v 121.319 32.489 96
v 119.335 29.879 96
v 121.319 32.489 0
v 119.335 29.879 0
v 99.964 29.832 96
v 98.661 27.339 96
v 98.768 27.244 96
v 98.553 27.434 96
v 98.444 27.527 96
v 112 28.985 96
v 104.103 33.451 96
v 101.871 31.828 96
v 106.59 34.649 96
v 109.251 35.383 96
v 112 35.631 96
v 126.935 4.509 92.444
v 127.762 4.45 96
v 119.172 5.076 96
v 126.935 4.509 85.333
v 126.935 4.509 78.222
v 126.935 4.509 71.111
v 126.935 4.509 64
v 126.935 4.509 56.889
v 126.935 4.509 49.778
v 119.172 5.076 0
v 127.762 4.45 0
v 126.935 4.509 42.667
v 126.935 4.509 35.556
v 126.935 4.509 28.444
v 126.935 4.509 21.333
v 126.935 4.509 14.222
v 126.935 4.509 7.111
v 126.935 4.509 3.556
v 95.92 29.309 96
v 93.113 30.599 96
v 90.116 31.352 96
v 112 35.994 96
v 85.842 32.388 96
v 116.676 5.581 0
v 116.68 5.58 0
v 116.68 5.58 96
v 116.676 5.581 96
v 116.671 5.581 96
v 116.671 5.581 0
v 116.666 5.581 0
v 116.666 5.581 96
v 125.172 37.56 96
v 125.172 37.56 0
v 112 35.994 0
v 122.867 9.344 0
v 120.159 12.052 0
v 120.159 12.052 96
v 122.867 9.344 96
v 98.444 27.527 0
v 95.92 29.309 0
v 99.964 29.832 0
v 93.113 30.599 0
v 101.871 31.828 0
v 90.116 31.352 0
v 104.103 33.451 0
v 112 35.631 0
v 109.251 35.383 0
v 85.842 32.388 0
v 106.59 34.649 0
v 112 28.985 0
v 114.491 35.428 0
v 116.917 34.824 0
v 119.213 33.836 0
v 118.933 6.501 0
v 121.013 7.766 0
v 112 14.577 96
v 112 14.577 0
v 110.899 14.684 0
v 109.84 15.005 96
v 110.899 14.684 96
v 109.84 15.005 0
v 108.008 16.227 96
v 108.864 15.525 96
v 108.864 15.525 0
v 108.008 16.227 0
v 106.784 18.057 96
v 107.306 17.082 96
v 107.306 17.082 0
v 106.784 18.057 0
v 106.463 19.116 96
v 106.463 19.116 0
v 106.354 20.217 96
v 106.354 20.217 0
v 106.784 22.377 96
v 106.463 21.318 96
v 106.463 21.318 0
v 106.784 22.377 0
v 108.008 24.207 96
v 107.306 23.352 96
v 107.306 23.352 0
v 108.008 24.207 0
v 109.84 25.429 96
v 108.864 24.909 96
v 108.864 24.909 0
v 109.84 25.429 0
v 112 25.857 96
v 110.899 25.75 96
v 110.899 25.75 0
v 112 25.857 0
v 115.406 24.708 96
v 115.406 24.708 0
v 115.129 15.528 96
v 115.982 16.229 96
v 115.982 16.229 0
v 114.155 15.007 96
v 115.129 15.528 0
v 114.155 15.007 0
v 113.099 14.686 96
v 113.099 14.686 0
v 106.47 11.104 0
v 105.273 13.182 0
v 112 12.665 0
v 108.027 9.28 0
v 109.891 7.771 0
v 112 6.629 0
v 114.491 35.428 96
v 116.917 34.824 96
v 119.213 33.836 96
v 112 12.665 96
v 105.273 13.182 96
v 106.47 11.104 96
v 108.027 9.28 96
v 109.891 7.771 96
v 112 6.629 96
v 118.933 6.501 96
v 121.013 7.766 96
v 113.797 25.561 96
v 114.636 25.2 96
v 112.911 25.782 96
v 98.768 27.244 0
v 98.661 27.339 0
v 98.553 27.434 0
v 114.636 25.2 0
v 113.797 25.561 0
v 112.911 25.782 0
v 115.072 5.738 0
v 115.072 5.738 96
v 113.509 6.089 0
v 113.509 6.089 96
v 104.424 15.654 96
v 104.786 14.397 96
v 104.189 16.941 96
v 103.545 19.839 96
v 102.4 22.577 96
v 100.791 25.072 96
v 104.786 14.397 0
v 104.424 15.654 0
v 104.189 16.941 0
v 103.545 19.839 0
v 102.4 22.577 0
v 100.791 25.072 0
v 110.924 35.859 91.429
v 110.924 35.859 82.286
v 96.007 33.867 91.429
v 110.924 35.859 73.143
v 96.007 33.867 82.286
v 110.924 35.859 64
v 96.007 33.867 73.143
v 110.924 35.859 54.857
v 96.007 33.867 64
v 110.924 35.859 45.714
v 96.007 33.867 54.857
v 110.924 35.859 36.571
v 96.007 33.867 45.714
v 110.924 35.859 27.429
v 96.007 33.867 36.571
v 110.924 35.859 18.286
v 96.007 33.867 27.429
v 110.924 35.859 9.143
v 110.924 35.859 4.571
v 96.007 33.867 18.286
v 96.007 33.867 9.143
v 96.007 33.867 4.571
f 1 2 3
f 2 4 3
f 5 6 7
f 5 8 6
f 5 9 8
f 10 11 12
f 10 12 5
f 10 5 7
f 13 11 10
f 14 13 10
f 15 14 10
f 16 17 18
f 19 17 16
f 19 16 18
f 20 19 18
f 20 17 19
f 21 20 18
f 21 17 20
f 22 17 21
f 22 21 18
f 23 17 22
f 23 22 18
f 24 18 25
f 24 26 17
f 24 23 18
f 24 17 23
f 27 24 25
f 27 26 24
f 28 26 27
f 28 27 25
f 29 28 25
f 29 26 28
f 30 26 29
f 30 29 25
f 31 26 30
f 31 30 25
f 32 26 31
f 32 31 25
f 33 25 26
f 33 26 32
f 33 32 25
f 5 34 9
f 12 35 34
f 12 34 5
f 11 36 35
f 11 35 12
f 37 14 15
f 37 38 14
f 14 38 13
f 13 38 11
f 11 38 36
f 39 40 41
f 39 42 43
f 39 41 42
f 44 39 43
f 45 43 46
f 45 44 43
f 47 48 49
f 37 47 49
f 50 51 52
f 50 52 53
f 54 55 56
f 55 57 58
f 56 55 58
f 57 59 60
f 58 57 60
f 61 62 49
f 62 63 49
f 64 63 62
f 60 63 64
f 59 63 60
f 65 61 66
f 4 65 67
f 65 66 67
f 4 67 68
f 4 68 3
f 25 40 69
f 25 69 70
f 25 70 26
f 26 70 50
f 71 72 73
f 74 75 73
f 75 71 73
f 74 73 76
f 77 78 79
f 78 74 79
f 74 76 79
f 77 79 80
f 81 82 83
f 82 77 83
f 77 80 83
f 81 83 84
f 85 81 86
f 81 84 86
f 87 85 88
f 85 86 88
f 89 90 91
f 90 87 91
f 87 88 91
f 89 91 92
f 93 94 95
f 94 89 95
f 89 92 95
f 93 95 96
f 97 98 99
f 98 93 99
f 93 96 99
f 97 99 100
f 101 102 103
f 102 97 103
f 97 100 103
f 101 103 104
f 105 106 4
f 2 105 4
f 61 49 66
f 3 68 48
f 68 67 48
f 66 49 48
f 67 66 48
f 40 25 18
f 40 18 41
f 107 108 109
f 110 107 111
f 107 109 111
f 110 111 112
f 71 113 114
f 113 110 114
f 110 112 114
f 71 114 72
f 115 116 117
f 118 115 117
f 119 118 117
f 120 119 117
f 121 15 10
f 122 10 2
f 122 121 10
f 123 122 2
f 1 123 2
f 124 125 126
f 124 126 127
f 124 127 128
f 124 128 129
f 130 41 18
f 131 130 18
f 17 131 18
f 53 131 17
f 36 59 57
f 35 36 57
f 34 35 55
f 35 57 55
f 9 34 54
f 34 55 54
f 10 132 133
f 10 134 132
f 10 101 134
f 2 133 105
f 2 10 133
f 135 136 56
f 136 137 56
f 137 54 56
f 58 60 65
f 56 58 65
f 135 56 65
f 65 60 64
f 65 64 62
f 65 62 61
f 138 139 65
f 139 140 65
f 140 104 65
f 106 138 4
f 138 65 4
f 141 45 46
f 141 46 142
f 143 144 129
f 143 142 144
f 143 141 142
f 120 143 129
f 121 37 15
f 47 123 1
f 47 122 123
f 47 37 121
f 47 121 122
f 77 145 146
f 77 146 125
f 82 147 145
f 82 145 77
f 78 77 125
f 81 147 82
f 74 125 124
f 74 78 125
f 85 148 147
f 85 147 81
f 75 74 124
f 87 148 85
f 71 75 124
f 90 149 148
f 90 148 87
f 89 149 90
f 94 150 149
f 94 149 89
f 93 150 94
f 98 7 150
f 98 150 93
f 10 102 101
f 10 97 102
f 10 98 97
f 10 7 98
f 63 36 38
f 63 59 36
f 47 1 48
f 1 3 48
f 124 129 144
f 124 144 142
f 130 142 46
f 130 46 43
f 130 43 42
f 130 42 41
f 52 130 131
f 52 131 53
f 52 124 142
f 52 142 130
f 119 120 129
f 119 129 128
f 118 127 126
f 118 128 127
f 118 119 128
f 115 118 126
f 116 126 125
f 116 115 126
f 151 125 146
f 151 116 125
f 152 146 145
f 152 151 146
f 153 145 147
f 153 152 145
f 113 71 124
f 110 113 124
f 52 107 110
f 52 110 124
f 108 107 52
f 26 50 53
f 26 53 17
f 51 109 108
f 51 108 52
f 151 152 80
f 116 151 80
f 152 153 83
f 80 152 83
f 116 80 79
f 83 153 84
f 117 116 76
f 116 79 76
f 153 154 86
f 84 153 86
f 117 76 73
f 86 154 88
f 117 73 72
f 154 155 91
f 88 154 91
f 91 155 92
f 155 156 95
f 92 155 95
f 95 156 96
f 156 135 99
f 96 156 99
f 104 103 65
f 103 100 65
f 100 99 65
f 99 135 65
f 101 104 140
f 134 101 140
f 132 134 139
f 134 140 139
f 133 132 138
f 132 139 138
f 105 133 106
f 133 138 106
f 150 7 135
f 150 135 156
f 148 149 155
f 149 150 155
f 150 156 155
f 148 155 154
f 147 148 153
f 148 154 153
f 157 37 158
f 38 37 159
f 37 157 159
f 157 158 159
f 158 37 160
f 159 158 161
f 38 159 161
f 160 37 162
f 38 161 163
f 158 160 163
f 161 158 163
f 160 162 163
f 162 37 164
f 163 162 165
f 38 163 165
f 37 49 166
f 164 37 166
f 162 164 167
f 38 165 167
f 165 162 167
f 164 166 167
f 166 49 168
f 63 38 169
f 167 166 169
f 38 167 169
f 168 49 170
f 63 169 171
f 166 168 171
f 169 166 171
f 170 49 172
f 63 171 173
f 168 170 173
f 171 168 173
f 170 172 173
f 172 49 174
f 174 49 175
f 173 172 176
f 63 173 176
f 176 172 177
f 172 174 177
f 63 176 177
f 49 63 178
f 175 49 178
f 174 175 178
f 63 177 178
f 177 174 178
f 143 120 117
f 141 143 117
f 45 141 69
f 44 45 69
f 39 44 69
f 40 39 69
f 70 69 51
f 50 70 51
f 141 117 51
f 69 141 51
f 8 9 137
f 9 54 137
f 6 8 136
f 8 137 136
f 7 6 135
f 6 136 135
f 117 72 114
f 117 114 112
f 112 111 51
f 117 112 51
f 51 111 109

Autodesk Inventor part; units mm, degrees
ref_plane "YZ Plane" through (0, 0, 0) normal (1, 0, 0) x (0, 1, 0)
ref_plane "XZ Plane" through (0, 0, 0) normal (0, 1, 0) x (-1, 0, 0)
ref_plane "XY Plane" through (0, 0, 0) normal (0, 0, 1) x (1, 0, 0)
sketch "Sketch1" plane through (0, 0, 0) normal (0, 0, 1) x (1, 0, 0)
  spline S0 degree 4 poles (254.4361, 38.2581) (252.1599, 38.6503) (246.7887, 39.4993) (237.9849, 40.6183) (225.3575, 41.7043) (211.2027, 42.3417) (196.3926, 42.4701) (181.0313, 42.0702) (165.5064, 41.2217) (149.7852, 40.0448) (134.1096, 38.5775) (118.6247, 36.8508) (103.5, 34.9393) (88.9016, 32.8834) (74.9958, 30.7382) (61.9178, 28.5627) (49.8271, 26.4098) (38.8354, 24.34) (29.0772, 22.4039) (20.6323, 20.6564) (13.6456, 19.1491) (6.9132, 17.6607) (2.9022, 16.74) (0.4691, 16.1882) (0, 16.065) knots 0.214297 0.214297 0.214297 0.214297 0.214297 0.24332 0.281775 0.321542 0.36238 0.404005 0.446178 0.488665 0.531231 0.573688 0.615803 0.657336 0.698047 0.737682 0.775986 0.812688 0.847495 0.880087 0.910093 0.937059 0.960363 1 1 1 1 1
  spline S1 degree 4 poles (300, 15.624) (299.8057, 13.313) (297.7085, 10.3432) (293.0509, 7.5008) (285.3959, 4.883) (278.1124, 3.2165) (269.5147, 1.8925) (259.681, 0.913) (248.7129, 0.2783) (236.7119, -0.0309) (223.8067, -0.0504) (210.1253, 0.1933) (195.7754, 0.645) (180.9677, 1.2494) (165.6517, 1.9825) (150.1916, 2.9048) (134.6873, 3.9451) (119.3375, 5.0495) (104.3042, 6.1987) (89.7566, 7.3561) (75.8492, 8.4887) (62.7429, 9.5824) (50.5811, 10.6226) (39.4971, 11.5797) (29.6294, 12.4513) (21.0712, 13.2264) (13.9639, 13.8721) (7.1036, 14.5126) (2.9683, 14.8997) (0.533, 15.1397) (-0.0042, 15.1841) knots 0 0 0 0 0 0.054372 0.079821 0.107912 0.138499 0.171341 0.206187 0.242784 0.280891 0.320277 0.360713 0.402023 0.443985 0.486373 0.528958 0.57146 0.613642 0.655265 0.696085 0.735853 0.774308 0.811174 0.846157 0.87893 0.909115 0.936252 0.959711 1 1 1 1 1
  arc A0 (0, 16.065) -> (-0.0042, 15.1841) centre (0.1158, 15.624) ccw
  line L0 (0.1158, 15.624) -> (227.9902, 15.624) construction
  line L1 (300, 15.624) -> (0.1158, 15.624) construction
  line L2 (300, 15.624) -> (200, 15.624) construction
  line L3 (200, 15.624) -> (200, 42.3773) construction
  line L4 (200, 15.624) -> (200, 0.5273)
  line L5 (0, 0) -> (0, 20.241)
  line L6 (0, 20.241) -> (238.581, 20.241) construction
  circle A1 centre (238.581, 20.241) radius 14
  line L7 (238.581, 20.241) -> (208.581, 20.241)
  line L8 (238.581, 25.359) -> (238.581, 20.241)
  line L9 (0, 20.241) -> (112, 20.241) construction
  circle A2 centre (112, 20.241) radius 5.39
  line L10 (0, 15.624) -> (112, 15.624) construction
  line L11 (0, 15.624) -> (112, 15.624) construction
  line L12 (112, 15.624) -> (112, 35.9945)
  line L13 (112, 15.624) -> (112, 5.6153)
  spline S2 degree 4 poles (299.2852, 20.241) (299.2279, 20.1316) (299.168, 20.0232) (299.1056, 19.9158) (299.0406, 19.8092) knots 0.014818 0.014818 0.014818 0.014818 0.014818 0.017711 0.017711 0.017711 0.017711 0.017711
  line L14 (299.2071, 20.0822) -> (298.8742, 19.5363) construction
  arc A3 (298.904, 19.5932) -> (299.1702, 20.0296) centre (292.2911, 23.9254) ccw construction
  line L15 (299.432, 20.5214) -> (299.1384, 19.9606) construction
  arc A4 (299.1639, 20.0188) -> (299.3987, 20.4672) centre (292.801, 23.6361) ccw construction
  spline S3 degree 2 poles (295.8506, 16.56) (295.1573, 16.0692) (294.3933, 15.624) knots 0 0 0 1 1 1
  line L16 (294.5507, 15.7157) -> (294.2359, 15.5323) construction
  arc A5 (294.2672, 15.5511) -> (294.519, 15.6978) centre (283.8844, 33.657) ccw construction
  spline S4 degree 4 poles (296.8569, 15.624) (296.6183, 15.8629) (296.3707, 16.0985) (296.1147, 16.3309) (295.8506, 16.56) knots 0.044099 0.044099 0.044099 0.044099 0.044099 0.050856 0.050856 0.050856 0.050856 0.050856
  spline S5 degree 4 poles (219.5872, 34.9119) (218.6954, 34.952) (214.8585, 35.1063) (210.7072, 35.3295) (192.898, 35.4464) (181.4278, 35.0555) (165.1774, 34.1819) (149.5619, 33.1267) (133.8284, 31.3479) (128.2654, 31.0974) (123.3908, 30.59) knots 0 0 0 0 0 0.139244 0.23322 0.363937 0.509983 0.657115 0.798105 1 1 1 1 1
  line L17 (295.9593, 16.4657) -> (295.7419, 16.6543) construction
  arc A6 (295.9374, 16.4843) -> (295.7635, 16.6352) centre (281.8729, 0.4516) ccw construction
  line L18 (232.7438, 34.3645) -> (201.1936, 35.6815) construction
  arc A7 (229.5868, 34.4549) -> (204.3471, 35.5085) centre (136.3483, -1896.3245) ccw construction
  arc A8 (264.2661, 15.123) -> (264.3608, 15.624) centre (238.581, 20.241) ccw
  circle A9 centre (238.581, 20.241) radius 24
  circle A10 centre (112, 20.241) radius 15.39
  spline S6 degree 4 poles (300, 15.624) (300.2691, 17.9337) (298.7834, 21.2677) (294.6934, 24.9798) (287.5317, 28.9406) (280.4869, 31.8205) (271.481, 34.7182) (262.4868, 36.793) (257.7004, 37.6957) (254.4361, 38.2581) knots 0 0 0 0 0 0.247555 0.363857 0.49255 0.632996 0.778264 1 1 1 1 1
  line L19 (285.2945, 32.941) -> (223.5776, 43.5753) construction
  arc A11 (278.7224, 32.6349) -> (229.6682, 41.0872) centre (217.2184, -177.7386) ccw construction
  line L20 (285.2945, 32.941) -> (223.5776, 43.5753) construction
  arc A12 (278.8771, 33.0418) -> (229.6586, 41.5224) centre (200.8949, -272.4733) ccw construction
  spline S7 degree 4 poles (251.493, 31.7362) (243.7009, 32.9676) (232.1602, 34.2966) (216.4428, 35.2879) (196.3923, 35.4611) (181.0317, 35.0615) (165.5053, 34.2127) (149.7883, 33.0365) (134.1012, 31.5672) (118.6474, 29.8462) (103.4397, 27.9193) (89.0589, 25.9037) (74.8371, 23.6927) (62.4884, 21.6695) (49.6399, 19.3545) (46.3795, 18.7429) (43.8125, 18.259) knots 0 0 0 0 0 0.163963 0.232338 0.302031 0.372642 0.443778 0.515047 0.586134 0.656647 0.726187 0.794348 0.86071 0.920346 1 1 1 1 1
  spline S8 degree 4 poles (295.845, 16.556) (295.7198, 16.6646) (294.585, 17.6283) (292.0585, 19.4283) (287.5167, 21.9347) (280.467, 24.8321) (271.9714, 27.5226) (264.2087, 29.4004) (258.4092, 30.5515) (255.0536, 31.1429) (254.4361, 31.2493) (253.9689, 31.3298) (253.5018, 31.4103) (253.0347, 31.4908) (252.5676, 31.5712) knots 0.050892 0.050892 0.050892 0.050892 0.050892 0.054094 0.079507 0.107628 0.138317 0.171335 0.206423 0.214297 0.214297 0.214297 0.214297 0.220253 0.220253 0.220253 0.220253 0.220253
  line L21 (285.2945, 25.9322) -> (223.5776, 36.5664) construction
  line L22 (285.2945, 25.9322) -> (223.5776, 36.5664) construction
  arc A13 (278.7224, 25.626) -> (229.6682, 34.0784) centre (217.2184, -184.7474) ccw construction
  line L23 (270.129, 9.1254) -> (275.129, 9.1254) construction
  line L24 (281.07, 24.4582) -> (286.07, 24.4582) construction
  line L25 (318.8214, -3.3673) -> (272.8686, 36.4793) construction
  arc A14 (303.2079, 0.552) -> (278.9595, 21.5782) centre (281.8576, 0.4252) ccw construction
  spline S9 degree 4 poles (295.8353, 16.5644) (293.4171, 14.8846) (288.4135, 12.6926) (280.7063, 10.6698) (269.511, 8.9398) (259.6826, 7.9632) (248.7122, 7.3273) (236.7121, 7.0186) (223.8065, 6.9989) (210.1254, 7.2427) (195.7753, 7.6944) (180.968, 8.2987) (165.6509, 9.032) (150.1939, 9.954) (134.681, 10.995) (119.3545, 12.0974) (104.259, 13.2519) (89.8748, 14.3954) (75.7524, 15.5471) (62.9065, 16.6165) (50.5107, 17.6776) (46.5166, 18.0246) (43.8125, 18.259) knots 0 0 0 0 0 0.084767 0.124025 0.166179 0.210904 0.257877 0.306788 0.35734 0.409241 0.462263 0.516122 0.570528 0.625186 0.679738 0.73388 0.787304 0.839697 0.89074 0.937143 1 1 1 1 1
  spline S10 degree 4 poles (21.4623, 20.241) (20.6227, 20.317) (20.124, 20.3622) (19.9191, 20.3809) (19.554, 20.414) knots 0.979732 0.979732 0.979732 0.979732 0.979732 1 1 1 1 1 construction
  line L26 (68.4884, 16.1198) -> (19.1367, 20.3983) construction
  arc A15 (63.5515, 16.5281) -> (24.0702, 19.9509) centre (-819.8994, -9944.3712) ccw construction
  line L27 (21.7244, 20.2173) -> (21.2001, 20.2647) construction
  arc A16 (21.2525, 20.26) -> (21.672, 20.222) centre (898.6358, 9712.9556) ccw construction
  line L28 (74.2541, 23.9969) -> (13.371, 12.5211) construction
  arc A17 (68.1759, 22.7939) -> (19.47, 13.6134) centre (1053.3901, -5337.891) ccw construction
  spline S11 degree 4 poles (218.4375, 7.1934) (217.6173, 7.2408) (213.8192, 7.4688) (209.5863, 6.8507) (192.5485, 7.9441) (181.1469, 8.163) (165.7461, 9.0283) (149.1424, 9.8801) (139.9777, 10.7519) (129.1073, 11.2464) (124.6867, 11.5289) knots 0 0 0 0 0 0.127631 0.213723 0.333628 0.467446 0.602621 0.738424 0.880395 0.880395 0.880395 0.880395 0.880395
  line L29 (133.5337, 10.9635) -> (115.8396, 12.0942) construction
  arc A18 (117.618, 12.0789) -> (131.7678, 11.1747) centre (141.027, 267.2384) ccw construction
  line L30 (140.665, 32.3881) -> (106.1166, 28.792) construction
  arc A19 (137.222, 31.4497) -> (109.679, 28.5828) centre (140.6225, -134.9596) ccw construction
  circle A20 centre (238.581, 20.241) radius 18
  line L31 (238.581, 38.241) -> (225.78, 41.559)
  line L32 (238.581, 2.241) -> (224.22, 0)
  line L33 (214.581, 20.241) -> (214.581, 42.1266) construction
  line L34 (127.39, 20.241) -> (127.39, 11.5255) construction
  line L35 (127.39, 20.241) -> (131.3139, 20.241) construction
  line L36 (96.61, 20.241) -> (96.61, 13.8631) construction
  line L37 (270.129, 5.6153) -> (270.129, 15.624) construction
  line L38 (272.129, 7.6153) -> (272.129, 13.624)
  line L39 (268.129, 13.624) -> (268.129, 7.6153)
  arc A21 (268.129, 7.6153) -> (272.129, 7.6153) centre (270.129, 7.6153) ccw
  arc A22 (272.129, 13.624) -> (268.129, 13.624) centre (270.129, 13.624) ccw
  line L40 (270.129, 32.1807) -> (270.129, 22.172) construction
  line L41 (272.129, 30.1807) -> (272.129, 24.172)
  line L42 (268.129, 24.172) -> (268.129, 30.1807)
  arc A23 (272.129, 30.1807) -> (268.129, 30.1807) centre (270.129, 30.1807) ccw
  arc A24 (268.129, 24.172) -> (272.129, 24.172) centre (270.129, 24.172) ccw
  arc A25 (200, 42.3155) -> (199.8539, 42.3773) centre (190.581, 20.241) ccw
  arc A26 (171.273, 34.4958) -> (171.2681, 34.4892) centre (190.581, 20.241) ccw
  arc A27 (210.7484, 7.2304) -> (209.2875, 35.2765) centre (190.581, 20.241) ccw
  arc A28 (169.4455, 8.8703) -> (169.4744, 8.8168) centre (190.581, 20.241) ccw
  arc A29 (153.9768, 9.6824) -> (154.0303, 9.7394) centre (142.78, 20.241) ccw
  arc A30 (151.2419, 33.0959) -> (151.2193, 33.1107) centre (142.78, 20.241) ccw
  arc A31 (132.1299, 31.3508) -> (130.3229, 11.2037) centre (142.78, 20.241) ccw
  arc A32 (95.2741, 13.9693) -> (95.1698, 26.7415) centre (81.22, 20.241) ccw
  arc A33 (66.334, 16.3348) -> (66.5389, 15.624) centre (81.22, 20.241) ccw
  line L43 (112, 20.241) -> (112, 14.851) construction
  line L44 (112, 14.851) -> (91.265, 14.851) construction
  circle A34 centre (91.265, 14.851) radius 4
  circle A35 centre (111.9941, 20.217) radius 5.39
  arc A36 (104.1892, 16.9411) -> (90.1164, 31.3517) centre (87.5379, 14.7568) ccw
  arc A37 (104.1892, 16.9411) -> (116.9519, 5.574) centre (117.1466, 18.6408) ccw
  line L45 (90.1164, 31.3517) -> (85.8424, 32.3881)
  line L46 (119.172, 5.076) -> (116.6664, 5.5813)
  circle A38 centre (238.581, 20.241) radius 13.69
  circle A39 centre (111.9941, 20.217) radius 5.64
  line L47 (111.9941, 20.217) -> (125.1716, 37.5596)
  line L48 (111.9941, 20.217) -> (127.7615, 4.4495)
  line L49 (111.9941, 20.217) -> (119.9703, 20.217) construction
  point P0 (0.783, 16.254)
  point P1 (3.213, 16.812)
  point P2 (7.239, 17.724)
  point P3 (12.813, 18.96)
  point P4 (19.884, 20.484)
  point P5 (28.374, 22.245)
  point P6 (38.199, 24.195)
  point P7 (49.254, 26.28)
  point P8 (61.419, 28.446)
  point P9 (74.571, 30.636)
  point P10 (88.56, 32.793)
  point P11 (103.242, 34.86)
  point P12 (118.455, 36.783)
  point P13 (134.028, 38.511)
  point P14 (149.793, 39.984)
  point P15 (165.576, 41.16)
  point P16 (181.206, 41.985)
  point P17 (196.638, 42.363)
  point P18 (211.554, 42.222)
  point P19 (239.145, 40.389)
  point P20 (262.68, 36.666)
  point P21 (272.577, 34.218)
  point P22 (281.07, 31.467)
  point P23 (288.069, 28.491)
  point P24 (293.505, 25.359)
  point P25 (297.324, 22.137)
  point P26 (300, 15.624)
  point P27 (0.861, 15.105)
  point P28 (3.342, 14.868)
  point P29 (7.446, 14.481)
  point P30 (13.122, 13.953)
  point P31 (20.31, 13.296)
  point P32 (28.92, 12.519)
  point P33 (38.856, 11.64)
  point P34 (50.007, 10.674)
  point P35 (62.244, 9.63)
  point P36 (75.429, 8.529)
  point P37 (89.418, 7.389)
  point P38 (104.052, 6.228)
  point P39 (134.613, 3.966)
  point P40 (150.207, 2.928)
  point P41 (165.783, 2.013)
  point P42 (181.167, 1.263)
  point P43 (196.068, 0.663)
  point P44 (210.468, 0.225)
  point P45 (237.189, 0.039)
  point P46 (249.246, 0.378)
  point P47 (260.262, 1.05)
  point P48 (270.129, 2.076)
  point P49 (278.739, 3.462)
  point P50 (285.993, 5.211)
  point P51 (291.81, 7.314)
  point P52 (296.121, 9.756)
  point P53 (298.863, 12.531)
  point P54 (200, 15.624)
  point P55 (225.3642, 15.624)
  point P56 (238.581, 6.241)
  point P57 (238.581, 34.241)
  point P58 (225.3642, 15.624)
  point P59 (251.7978, 15.624)
  point P60 (0, 16.065)
  point P61 (0, 15.1838)
  point P62 (224.581, 20.241)
  point P63 (112, 25.631)
  point P64 (0, 9.065)
  point P65 (0.783, 9.254)
  point P66 (3.213, 9.812)
  point P67 (7.239, 10.724)
  point P68 (12.813, 11.96)
  point P69 (19.884, 13.484)
  point P70 (28.374, 15.245)
  point P71 (38.199, 17.195)
  point P72 (49.254, 19.28)
  point P73 (61.419, 21.446)
  point P74 (74.571, 23.636)
  point P75 (88.56, 25.793)
  point P76 (103.242, 27.86)
  point P77 (118.455, 29.783)
  point P78 (134.028, 31.511)
  point P79 (149.793, 32.984)
  point P80 (165.576, 34.16)
  point P81 (181.206, 34.985)
  point P82 (225.78, 34.559)
  point P83 (239.145, 33.389)
  point P84 (251.493, 31.745)
  point P85 (262.68, 29.666)
  point P86 (272.577, 27.218)
  point P87 (281.07, 24.467)
  point P88 (288.069, 21.491)
  point P89 (293.505, 18.359)
  point P90 (297.324, 15.137)
  point P91 (299.493, 11.879)
  point P92 (300, 8.624)
  point P93 (-0.0042, 22.1841)
  point P94 (0.861, 22.105)
  point P95 (3.342, 21.868)
  point P96 (7.446, 21.481)
  point P97 (13.122, 20.953)
  point P98 (20.31, 20.296)
  point P99 (28.92, 19.519)
  point P100 (38.856, 18.64)
  point P101 (50.007, 17.674)
  point P102 (62.244, 16.63)
  point P103 (75.429, 15.529)
  point P104 (89.418, 14.389)
  point P105 (104.052, 13.228)
  point P106 (119.172, 12.076)
  point P107 (134.613, 10.966)
  point P108 (150.207, 9.928)
  point P109 (165.783, 9.013)
  point P110 (181.167, 8.263)
  point P111 (196.068, 7.663)
  point P112 (210.468, 7.225)
  point P113 (224.22, 7)
  point P114 (237.189, 7.039)
  point P115 (249.246, 7.378)
  point P116 (260.262, 8.05)
  point P117 (270.129, 9.076)
  point P118 (278.739, 10.462)
  point P119 (285.993, 12.211)
  point P120 (291.81, 14.314)
  point P121 (296.121, 16.756)
  point P122 (298.863, 19.531)
  point P123 (300, 22.624)
  point P124 (18.7405, 20.241)
  point P125 (216.9687, 35.023)
  point P126 (0, 16.065)
  point P127 (296.8569, 15.624)
  point P128 (294.3933, 15.624)
  point P129 (219.5872, 34.9119)
  point P130 (123.3908, 30.59)
  point P131 (254.4361, 38.2581)
  point P132 (0, 9.0562)
  point P133 (0.783, 9.2452)
  point P134 (3.213, 9.8032)
  point P135 (7.239, 10.7152)
  point P136 (12.813, 11.9512)
  point P137 (19.884, 13.4752)
  point P138 (28.374, 15.2362)
  point P139 (38.199, 17.1862)
  point P140 (49.254, 19.2712)
  point P141 (61.419, 21.4372)
  point P142 (74.571, 23.6272)
  point P143 (88.56, 25.7842)
  point P144 (103.242, 27.8512)
  point P145 (118.455, 29.7742)
  point P146 (134.028, 31.5022)
  point P147 (149.793, 32.9752)
  point P148 (165.576, 34.1512)
  point P149 (181.206, 34.9762)
  point P150 (196.638, 35.3542)
  point P151 (211.554, 35.2132)
  point P152 (225.78, 34.5502)
  point P153 (262.68, 29.6572)
  point P154 (272.577, 27.2092)
  point P155 (297.324, 15.1282)
  point P156 (299.493, 11.8702)
  point P157 (300, 8.6152)
  point P158 (254.4361, 31.2493)
  point P159 (216.8848, -206.3625)
  point P160 (278.8769, 26.0734)
  point P161 (229.5906, 33.8662)
  point P162 (-0.0042, 22.2335)
  point P163 (0.861, 22.1544)
  point P164 (3.342, 21.9174)
  point P165 (7.446, 21.5304)
  point P166 (13.122, 21.0024)
  point P167 (28.92, 19.5684)
  point P168 (38.856, 18.6894)
  point P169 (50.007, 17.7234)
  point P170 (62.244, 16.6794)
  point P171 (75.429, 15.5784)
  point P172 (89.418, 14.4384)
  point P173 (104.052, 13.2774)
  point P174 (119.172, 12.1254)
  point P175 (134.613, 11.0154)
  point P176 (150.207, 9.9774)
  point P177 (165.783, 9.0624)
  point P178 (181.167, 8.3124)
  point P179 (196.068, 7.7124)
  point P180 (210.468, 7.2744)
  point P181 (224.22, 7.0494)
  point P182 (237.189, 7.0884)
  point P183 (249.246, 7.4274)
  point P184 (260.262, 8.0994)
  point P185 (278.739, 10.5114)
  point P186 (285.993, 12.2604)
  point P187 (296.121, 16.8054)
  point P188 (298.863, 19.5804)
  point P189 (300, 22.6734)
  point P190 (225.7, -0.0094)
  point P191 (252.2617, 0.522)
  point P192 (227.3495, 41.4508)
  point P193 (105.9778, 6.0782)
  point P194 (115.8008, 5.3277)
  point P195 (98.26, 27.1738)
  point P196 (260.4522, 30.1228)
  point P197 (123.5853, 30.3718)
  point P198 (134.5979, 31.5604)
  point P199 (134.4982, 31.5502)
  dimension "d38" = 10.78
  dimension "d17" = 100
  dimension "d19" = 20.241
  dimension "d20" = 238.581
  dimension "d21" = 28
  dimension "d37" = 112
  dimension "d39" = 112
  dimension "d40" = 0
  dimension "d43" = 10
  dimension "d44" = 10
  dimension "d55" = 4
  dimension "d56" = 90
  dimension "d58" = 4
  dimension "d59" = 20.735
  dimension "d60" = 8
  dimension "d61" = 16.794
  dimension "d62" = 24.4562
  dimension "d63" = 5.4601
  dimension "d64" = 13.0683
  dimension "d65" = 16.5949
  dimension "d66" = 2.5785
  dimension "d68" = 27.38
  dimension "d69" = 11.28
  dimension "d70" = 45
extrude "Extrusion3" add sketch "Sketch1" along normal blind 96 contours L47 A10 L12 S0 | L12 A10 A36 L45 S0 | L47 S7 L12 A10 | L12 S7 A36 A10 | L47 A39 L12 S7 | L12 A39 L13 S9 A37 A36 S7 | A39 L48 S9 L13 | S9 L48 A10 A37 L13 | L13 A37 S9 | L46 A10 L48 S1
properties part number "Flap Foam"
